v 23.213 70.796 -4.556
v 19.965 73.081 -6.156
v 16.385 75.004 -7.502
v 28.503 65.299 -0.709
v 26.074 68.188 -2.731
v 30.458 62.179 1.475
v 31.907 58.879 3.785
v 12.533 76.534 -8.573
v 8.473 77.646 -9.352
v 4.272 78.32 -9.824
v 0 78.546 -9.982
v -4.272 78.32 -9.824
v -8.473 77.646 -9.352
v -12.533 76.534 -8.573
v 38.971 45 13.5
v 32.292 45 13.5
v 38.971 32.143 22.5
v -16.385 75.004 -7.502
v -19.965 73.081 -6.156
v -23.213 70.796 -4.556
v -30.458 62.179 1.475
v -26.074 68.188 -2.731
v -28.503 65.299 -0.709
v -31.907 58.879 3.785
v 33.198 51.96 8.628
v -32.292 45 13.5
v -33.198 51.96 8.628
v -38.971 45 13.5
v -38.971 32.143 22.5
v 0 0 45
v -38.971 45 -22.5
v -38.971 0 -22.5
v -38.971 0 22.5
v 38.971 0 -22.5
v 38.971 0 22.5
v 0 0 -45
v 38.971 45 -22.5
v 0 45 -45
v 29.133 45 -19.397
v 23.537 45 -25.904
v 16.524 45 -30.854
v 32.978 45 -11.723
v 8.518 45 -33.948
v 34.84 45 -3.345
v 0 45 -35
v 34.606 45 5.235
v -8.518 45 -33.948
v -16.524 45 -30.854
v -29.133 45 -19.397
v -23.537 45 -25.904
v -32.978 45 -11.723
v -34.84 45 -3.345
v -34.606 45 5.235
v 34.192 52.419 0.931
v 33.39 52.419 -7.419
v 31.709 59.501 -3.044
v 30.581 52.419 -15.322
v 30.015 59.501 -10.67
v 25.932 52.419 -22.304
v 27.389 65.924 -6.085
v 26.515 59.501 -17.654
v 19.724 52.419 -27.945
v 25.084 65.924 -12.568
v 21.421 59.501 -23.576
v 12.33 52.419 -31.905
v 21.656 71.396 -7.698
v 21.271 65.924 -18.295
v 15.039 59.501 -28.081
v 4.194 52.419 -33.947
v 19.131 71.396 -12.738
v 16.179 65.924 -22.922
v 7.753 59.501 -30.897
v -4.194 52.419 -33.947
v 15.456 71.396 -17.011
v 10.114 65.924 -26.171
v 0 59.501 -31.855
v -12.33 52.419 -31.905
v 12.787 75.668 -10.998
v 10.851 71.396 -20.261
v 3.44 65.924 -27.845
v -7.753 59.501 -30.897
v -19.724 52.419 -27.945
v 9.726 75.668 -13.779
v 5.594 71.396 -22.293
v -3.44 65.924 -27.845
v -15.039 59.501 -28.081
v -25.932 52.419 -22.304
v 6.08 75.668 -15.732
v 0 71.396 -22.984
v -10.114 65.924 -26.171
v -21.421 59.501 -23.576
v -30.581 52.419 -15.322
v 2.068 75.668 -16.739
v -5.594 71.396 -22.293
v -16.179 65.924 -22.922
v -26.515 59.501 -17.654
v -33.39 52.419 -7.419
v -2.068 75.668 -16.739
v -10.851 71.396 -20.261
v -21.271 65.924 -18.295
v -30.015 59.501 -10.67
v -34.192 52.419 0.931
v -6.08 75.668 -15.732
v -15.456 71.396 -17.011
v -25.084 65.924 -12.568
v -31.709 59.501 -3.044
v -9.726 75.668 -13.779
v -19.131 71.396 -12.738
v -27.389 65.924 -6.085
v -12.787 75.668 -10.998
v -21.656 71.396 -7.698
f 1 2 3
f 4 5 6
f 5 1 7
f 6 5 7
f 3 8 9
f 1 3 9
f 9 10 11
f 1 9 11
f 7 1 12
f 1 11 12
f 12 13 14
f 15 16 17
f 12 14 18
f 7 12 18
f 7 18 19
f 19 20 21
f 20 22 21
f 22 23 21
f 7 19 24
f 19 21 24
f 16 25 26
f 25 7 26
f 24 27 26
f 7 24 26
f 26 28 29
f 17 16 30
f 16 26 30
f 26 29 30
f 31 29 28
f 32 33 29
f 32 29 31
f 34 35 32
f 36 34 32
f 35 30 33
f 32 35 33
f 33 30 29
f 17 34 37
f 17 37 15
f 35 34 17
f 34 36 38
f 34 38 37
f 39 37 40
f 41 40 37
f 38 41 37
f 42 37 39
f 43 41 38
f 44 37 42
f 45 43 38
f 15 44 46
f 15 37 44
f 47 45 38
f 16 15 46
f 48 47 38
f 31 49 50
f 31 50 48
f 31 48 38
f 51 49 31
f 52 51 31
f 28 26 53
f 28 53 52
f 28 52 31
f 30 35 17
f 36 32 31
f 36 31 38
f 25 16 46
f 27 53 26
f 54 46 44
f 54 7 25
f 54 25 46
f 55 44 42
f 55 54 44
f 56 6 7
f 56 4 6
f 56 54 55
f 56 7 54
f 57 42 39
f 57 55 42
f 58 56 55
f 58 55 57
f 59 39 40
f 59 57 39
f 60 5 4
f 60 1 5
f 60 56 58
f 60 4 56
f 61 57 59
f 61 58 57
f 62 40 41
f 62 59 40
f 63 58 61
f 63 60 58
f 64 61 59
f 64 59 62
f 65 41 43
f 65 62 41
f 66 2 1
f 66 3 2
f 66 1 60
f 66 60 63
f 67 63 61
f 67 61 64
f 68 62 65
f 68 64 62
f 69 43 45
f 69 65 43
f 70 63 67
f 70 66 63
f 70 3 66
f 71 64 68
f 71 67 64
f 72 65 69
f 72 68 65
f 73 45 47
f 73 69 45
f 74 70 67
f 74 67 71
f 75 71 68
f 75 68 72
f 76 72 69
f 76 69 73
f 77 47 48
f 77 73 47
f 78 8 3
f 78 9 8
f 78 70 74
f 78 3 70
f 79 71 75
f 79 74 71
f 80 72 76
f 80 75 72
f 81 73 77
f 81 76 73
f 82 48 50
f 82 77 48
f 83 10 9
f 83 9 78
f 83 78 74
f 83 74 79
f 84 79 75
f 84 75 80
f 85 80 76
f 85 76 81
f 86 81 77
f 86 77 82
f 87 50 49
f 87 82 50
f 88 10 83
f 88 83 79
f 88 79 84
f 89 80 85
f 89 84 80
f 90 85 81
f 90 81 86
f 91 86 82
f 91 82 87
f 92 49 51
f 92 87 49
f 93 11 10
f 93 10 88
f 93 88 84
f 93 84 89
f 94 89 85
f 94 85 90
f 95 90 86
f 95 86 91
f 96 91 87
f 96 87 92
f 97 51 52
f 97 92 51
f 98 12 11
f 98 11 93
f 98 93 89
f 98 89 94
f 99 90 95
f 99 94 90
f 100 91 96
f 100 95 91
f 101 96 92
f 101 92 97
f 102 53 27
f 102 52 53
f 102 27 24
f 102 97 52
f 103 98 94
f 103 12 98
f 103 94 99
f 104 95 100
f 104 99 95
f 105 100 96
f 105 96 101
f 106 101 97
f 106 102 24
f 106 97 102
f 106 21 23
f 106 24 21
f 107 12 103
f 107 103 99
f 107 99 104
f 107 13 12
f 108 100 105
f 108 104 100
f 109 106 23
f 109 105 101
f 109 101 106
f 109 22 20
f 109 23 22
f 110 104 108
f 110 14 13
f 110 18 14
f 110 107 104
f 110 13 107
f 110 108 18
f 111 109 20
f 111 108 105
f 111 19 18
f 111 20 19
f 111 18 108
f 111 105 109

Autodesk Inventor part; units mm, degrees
ref_plane "YZ Plane" through (0, 0, 0) normal (1, 0, 0) x (0, 1, 0)
ref_plane "XZ Plane" through (0, 0, 0) normal (0, 1, 0) x (-1, 0, 0)
ref_plane "XY Plane" through (0, 0, 0) normal (0, 0, 1) x (1, 0, 0)
sketch "Эскиз1" plane through (0, 0, 0) normal (0, 1, 0) x (-1, 0, 0)
  line L0 (0, -45) -> (-38.9711, -22.5)
  line L1 (-38.9711, -22.5) -> (-38.9711, 22.5)
  line L2 (-38.9711, 22.5) -> (0, 45)
  line L3 (0, 45) -> (38.9711, 22.5)
  line L4 (38.9711, 22.5) -> (38.9711, -22.5)
  line L5 (38.9711, -22.5) -> (0, -45)
  point P0 (0, 0)
  point P1 (0, 0)
  dimension "d2" = 45
extrude "Выдавливание1" add sketch "Эскиз1" along normal blind 45
sketch "Эскиз3" plane through (0, 0, 0) normal (1, 0, 0) x (0, 1, 0)
  line L0 (45, -22.5) -> (45, 22.5) projected
  line L1 (45, 0) -> (80, 0)
  line L2 (45, 22.5) -> (45, -22.5) projected
  line L3 (45, 0) -> (45, -35)
  arc A0 (45, -35) -> (45, 35) centre (45, 0) ccw
  point P0 (0, 0)
  dimension "d3" = 35
  dimension "d4" = 35
revolve "Вращение1" add sketch "Эскиз3" angle 360 about axis through (0, 45, 0) along (0, 1, 0)
sketch "Эскиз5" plane through (0, 0, 0) normal (1, 0, 0) x (0, 1, 0)
  arc A0 (45, -35) -> (45, 35) centre (45, 0) ccw projected
  line L0 (0, 22.5) -> (0, 45) projected
  line L1 (77.2198, 45) -> (0, 45)
  line L2 (97.7076, -23.3946) -> (97.7076, 45.0272)
  line L3 (97.7076, 45.0272) -> (76.0865, 45)
  line L4 (97.7076, -23.3946) -> (0, 45)
  point P0 (0, 0)
  point P1 (78.541, -10)
  point P2 (80, 0)
  dimension "d6" = 10
extrude "Выдавливание2" cut sketch "Эскиз5" along normal blind 100 and the other way blind 100
